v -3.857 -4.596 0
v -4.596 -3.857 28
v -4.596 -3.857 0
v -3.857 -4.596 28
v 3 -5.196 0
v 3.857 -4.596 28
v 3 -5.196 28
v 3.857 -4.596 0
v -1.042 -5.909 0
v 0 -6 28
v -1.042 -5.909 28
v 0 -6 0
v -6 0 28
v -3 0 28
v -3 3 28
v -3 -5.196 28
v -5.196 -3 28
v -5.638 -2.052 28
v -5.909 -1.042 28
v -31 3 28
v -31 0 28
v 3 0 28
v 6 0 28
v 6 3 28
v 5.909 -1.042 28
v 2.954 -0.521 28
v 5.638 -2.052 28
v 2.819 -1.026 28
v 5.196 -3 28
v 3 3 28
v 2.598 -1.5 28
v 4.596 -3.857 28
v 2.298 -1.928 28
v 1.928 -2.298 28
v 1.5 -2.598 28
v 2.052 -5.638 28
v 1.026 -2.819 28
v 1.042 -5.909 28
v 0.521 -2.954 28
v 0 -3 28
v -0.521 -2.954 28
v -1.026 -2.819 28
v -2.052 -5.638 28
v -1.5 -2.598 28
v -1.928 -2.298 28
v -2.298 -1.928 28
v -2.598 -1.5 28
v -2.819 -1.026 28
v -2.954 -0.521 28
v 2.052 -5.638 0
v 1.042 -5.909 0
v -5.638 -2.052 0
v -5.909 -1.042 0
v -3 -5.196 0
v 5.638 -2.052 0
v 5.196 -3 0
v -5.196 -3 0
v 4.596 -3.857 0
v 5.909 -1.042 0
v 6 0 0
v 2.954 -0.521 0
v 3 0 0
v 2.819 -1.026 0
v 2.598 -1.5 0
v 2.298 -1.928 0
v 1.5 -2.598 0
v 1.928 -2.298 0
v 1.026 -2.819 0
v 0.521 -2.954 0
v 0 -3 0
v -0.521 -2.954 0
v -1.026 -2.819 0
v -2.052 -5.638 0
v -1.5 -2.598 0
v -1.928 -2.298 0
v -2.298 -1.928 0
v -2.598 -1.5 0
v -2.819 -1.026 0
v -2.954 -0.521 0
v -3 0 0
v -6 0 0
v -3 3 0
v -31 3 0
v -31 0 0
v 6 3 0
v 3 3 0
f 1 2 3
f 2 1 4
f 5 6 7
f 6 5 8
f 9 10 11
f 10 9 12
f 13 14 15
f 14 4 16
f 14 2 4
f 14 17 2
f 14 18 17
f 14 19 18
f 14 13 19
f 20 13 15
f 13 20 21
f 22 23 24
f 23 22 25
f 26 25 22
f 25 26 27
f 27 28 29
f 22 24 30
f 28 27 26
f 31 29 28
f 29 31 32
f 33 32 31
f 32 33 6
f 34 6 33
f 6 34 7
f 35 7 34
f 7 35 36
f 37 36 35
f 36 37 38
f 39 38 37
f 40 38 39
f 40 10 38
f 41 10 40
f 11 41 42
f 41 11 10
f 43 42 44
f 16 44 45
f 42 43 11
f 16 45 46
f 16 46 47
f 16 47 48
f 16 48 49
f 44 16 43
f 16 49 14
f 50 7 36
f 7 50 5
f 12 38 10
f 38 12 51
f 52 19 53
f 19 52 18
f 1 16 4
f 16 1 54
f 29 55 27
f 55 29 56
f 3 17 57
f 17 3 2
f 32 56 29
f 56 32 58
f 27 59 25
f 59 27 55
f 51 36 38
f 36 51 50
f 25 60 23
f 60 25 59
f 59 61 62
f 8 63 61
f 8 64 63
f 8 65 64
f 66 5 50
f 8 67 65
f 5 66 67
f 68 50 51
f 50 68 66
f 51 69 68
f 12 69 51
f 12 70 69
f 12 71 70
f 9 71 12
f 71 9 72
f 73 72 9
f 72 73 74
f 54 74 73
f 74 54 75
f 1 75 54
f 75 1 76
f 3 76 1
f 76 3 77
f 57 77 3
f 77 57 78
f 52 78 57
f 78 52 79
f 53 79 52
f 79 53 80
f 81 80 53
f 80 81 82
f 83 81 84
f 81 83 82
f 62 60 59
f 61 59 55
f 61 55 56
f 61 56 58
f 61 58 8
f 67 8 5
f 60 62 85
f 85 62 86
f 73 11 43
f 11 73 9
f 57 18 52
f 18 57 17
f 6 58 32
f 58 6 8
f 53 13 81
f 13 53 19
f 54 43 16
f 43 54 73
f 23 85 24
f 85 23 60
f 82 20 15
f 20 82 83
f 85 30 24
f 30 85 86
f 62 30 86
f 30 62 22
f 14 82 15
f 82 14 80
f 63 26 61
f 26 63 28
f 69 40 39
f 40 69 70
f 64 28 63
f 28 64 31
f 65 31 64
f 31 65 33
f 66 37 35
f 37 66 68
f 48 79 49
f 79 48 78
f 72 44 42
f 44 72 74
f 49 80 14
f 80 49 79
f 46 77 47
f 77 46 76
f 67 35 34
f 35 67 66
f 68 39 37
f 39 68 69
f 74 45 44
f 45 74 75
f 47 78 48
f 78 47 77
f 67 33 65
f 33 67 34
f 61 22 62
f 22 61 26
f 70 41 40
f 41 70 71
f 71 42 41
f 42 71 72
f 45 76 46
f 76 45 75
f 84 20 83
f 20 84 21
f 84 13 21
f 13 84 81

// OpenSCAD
// file: Schraube.scad
$fn=36;

//Tickness
t=1.4;

/* Copy from here */

//Schraube oben durchmesser
//sod=5;
sod=7;
//Schraube unten durchmesser
//sud=2;
sud=3.5;
//Schraubenkopflänge
skl=4;
//Schraube Total
st=16.5;
//

module Schraube()
{
    color("red")
    translate([0,0,0])
    rotate([0,0,0])
    {
        cylinder(skl, d1=sod,d2=sud);
        cylinder(st, d=sud);
    }
}

//schraube();
// main file
//Kabelschelle

include <Schraube.scad>

$fn=36;

//USB
usb=4;
//LAN
lan=6;

d=lan;

t=2.5;

s=0.7;
montageband=28;

/*
difference()
{
    cylinder(h=d*3, d=d+t*2);
    cylinder(h=d*3, d=d);
    
    translate([-(d+t*2)/2,0,0])
    cube([d+t*2,d+t*2,d*3]);
}
*/

kabellaenge=d*16;

module kabel()
{
    color("gray")
    translate([0,0,-d*3])
    cylinder(h=kabellaenge, d=d);
}

//schellenbreite_kabel=d*2;
schellenbreite_kabel=montageband;
schellendicke_kabel=d*2;

module part_a()
{   
    difference()
    {
        cylinder(h=schellenbreite_kabel, d=schellendicke_kabel);    

        color("orange")
        translate([-d,0,0])
        cube([schellendicke_kabel,d,schellenbreite_kabel]);        
    }
    
    color("orange")
        translate([-d,0,0])
        cube([schellendicke_kabel,d/2,schellenbreite_kabel]);    
}

module schelle_halbkreis()
{   
    difference()
    {
        part_a();
        
        color("red")
        translate([-d/2,0,0])
        cube([d,d,schellenbreite_kabel]);
        
        kabel();
    }    
}

schelle_halbkreis();


/*
difference()
{
    translate([-d*3,0,0])
    color("blue")
    cube([schellendicke_kabel,d/2,schellenbreite_kabel]);    
    
    translate([-d*2,0,schellenbreite_kabel/2])
    rotate([270,0,0])
    scale([s,s,s])
    Schraube();
}
*/

translate([-montageband-d/2,0,0])
color("blue")
cube([montageband,d/2,schellenbreite_kabel]);
